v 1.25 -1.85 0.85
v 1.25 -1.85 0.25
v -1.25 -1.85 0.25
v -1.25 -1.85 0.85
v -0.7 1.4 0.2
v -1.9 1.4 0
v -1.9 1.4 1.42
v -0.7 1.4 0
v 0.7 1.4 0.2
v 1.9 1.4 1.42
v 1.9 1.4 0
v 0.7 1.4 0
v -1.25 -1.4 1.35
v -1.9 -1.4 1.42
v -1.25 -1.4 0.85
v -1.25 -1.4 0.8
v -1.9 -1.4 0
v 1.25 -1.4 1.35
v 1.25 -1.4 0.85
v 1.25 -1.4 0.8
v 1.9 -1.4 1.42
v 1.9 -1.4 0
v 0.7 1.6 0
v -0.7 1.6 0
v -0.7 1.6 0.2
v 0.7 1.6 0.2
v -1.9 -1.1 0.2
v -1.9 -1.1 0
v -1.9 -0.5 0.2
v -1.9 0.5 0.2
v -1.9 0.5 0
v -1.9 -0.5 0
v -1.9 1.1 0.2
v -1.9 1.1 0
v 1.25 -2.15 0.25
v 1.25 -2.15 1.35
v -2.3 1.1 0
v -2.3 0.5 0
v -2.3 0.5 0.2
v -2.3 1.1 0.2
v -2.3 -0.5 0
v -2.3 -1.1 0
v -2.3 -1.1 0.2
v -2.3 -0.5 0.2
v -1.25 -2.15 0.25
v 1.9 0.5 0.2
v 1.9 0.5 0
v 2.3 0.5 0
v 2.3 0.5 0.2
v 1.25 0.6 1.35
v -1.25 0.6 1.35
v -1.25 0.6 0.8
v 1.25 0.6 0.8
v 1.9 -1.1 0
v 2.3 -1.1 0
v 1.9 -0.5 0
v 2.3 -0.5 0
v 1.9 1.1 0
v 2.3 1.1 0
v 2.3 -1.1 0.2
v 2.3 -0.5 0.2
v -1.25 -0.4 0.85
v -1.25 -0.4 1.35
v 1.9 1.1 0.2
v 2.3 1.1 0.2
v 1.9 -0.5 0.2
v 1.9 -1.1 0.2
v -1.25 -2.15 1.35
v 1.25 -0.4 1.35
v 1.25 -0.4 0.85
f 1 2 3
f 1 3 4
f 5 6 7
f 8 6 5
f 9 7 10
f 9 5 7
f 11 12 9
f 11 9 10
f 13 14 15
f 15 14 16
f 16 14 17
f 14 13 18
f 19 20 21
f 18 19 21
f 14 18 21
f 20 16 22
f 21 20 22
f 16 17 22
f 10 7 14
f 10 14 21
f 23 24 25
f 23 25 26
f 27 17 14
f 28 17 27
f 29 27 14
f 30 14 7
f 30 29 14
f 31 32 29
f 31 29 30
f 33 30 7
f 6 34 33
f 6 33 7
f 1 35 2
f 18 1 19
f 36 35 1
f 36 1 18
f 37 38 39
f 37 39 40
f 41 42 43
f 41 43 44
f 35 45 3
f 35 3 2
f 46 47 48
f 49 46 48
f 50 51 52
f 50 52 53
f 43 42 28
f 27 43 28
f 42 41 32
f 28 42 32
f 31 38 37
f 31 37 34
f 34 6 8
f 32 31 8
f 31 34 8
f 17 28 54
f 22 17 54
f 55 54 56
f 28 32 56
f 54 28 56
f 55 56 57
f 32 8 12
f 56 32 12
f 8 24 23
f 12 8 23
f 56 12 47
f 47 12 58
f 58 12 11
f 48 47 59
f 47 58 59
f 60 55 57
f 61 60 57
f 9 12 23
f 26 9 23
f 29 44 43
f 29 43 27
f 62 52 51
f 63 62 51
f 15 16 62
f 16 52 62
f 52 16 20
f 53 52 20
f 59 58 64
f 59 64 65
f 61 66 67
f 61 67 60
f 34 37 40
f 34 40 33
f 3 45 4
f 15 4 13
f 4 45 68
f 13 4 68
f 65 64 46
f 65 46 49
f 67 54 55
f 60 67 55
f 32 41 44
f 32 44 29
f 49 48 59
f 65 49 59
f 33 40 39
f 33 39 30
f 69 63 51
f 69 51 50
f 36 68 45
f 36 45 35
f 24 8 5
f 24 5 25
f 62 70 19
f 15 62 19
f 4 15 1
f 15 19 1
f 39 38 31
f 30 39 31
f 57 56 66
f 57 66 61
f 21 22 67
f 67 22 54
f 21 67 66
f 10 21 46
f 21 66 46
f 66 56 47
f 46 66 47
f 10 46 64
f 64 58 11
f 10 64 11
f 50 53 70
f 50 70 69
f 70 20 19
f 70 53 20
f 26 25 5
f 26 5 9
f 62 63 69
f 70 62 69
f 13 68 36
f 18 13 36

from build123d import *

# Parameters (mm, degrees)
SKETCH004_W       = 2.5
SKETCH004_H       = 1.1
PAD001_DEPTH      = 0.75
PAD001_DEPTH_BACK = 1
SKETCH005_W       = 0.7
SKETCH005_H       = 1.6
POCKET001_DEPTH   = 2.501
SKETCH006_W       = 0.7
SKETCH006_H       = 0.6
SKETCH006_W_2     = 1.4
SKETCH006_H_2     = 0.4
PAD002_DEPTH      = 0.2
SKETCH002_W       = 3.8
SKETCH002_H       = 2.8
PAD_DEPTH         = 1.42
SKETCH003_W       = 2.5
SKETCH003_H       = 0.55
POCKET_DEPTH      = 2


with BuildPart() as buttonprofile_pocket:
    # Sketch004 → Pad001 (new body, two sides)
    with BuildSketch(Plane.XZ.offset(1.4)) as pad001_sk:
        with Locations((0, 0.8)):
            Rectangle(SKETCH004_W, SKETCH004_H)
    extrude(amount=PAD001_DEPTH)
    extrude(pad001_sk.sketch, amount=-PAD001_DEPTH_BACK)

    # Sketch005 → Pocket001 (cut, through all)
    with BuildSketch(Plane(origin=(1.25, -1.4, 0), x_dir=(0, 0, 1), z_dir=(1, 0, 0))):
        with Locations((0.5, -0.35)):
            Rectangle(SKETCH005_W, SKETCH005_H)
    extrude(amount=-POCKET001_DEPTH, mode=Mode.SUBTRACT)


with BuildPart() as pins_pad:
    # Sketch006 → Pad002 (new body)
    with BuildSketch(Plane.XY):
        with Locations((-1.95, -0.8)):
            Rectangle(SKETCH006_W, SKETCH006_H)
        with Locations((1.95, -0.8)):
            Rectangle(SKETCH006_W, SKETCH006_H)
        with Locations((1.95, 0.8)):
            Rectangle(SKETCH006_W, SKETCH006_H)
        with Locations((-1.95, 0.8)):
            Rectangle(SKETCH006_W, SKETCH006_H)
        with Locations((0, 1.4)):
            Rectangle(SKETCH006_W_2, SKETCH006_H_2)
    extrude(amount=PAD002_DEPTH)


with BuildPart() as fusion:
    # Sketch002 → Pad (new body)
    with BuildSketch(Plane.XY):
        Rectangle(SKETCH002_W, SKETCH002_H)
    extrude(amount=PAD_DEPTH)

    # Sketch003 → Pocket (cut)
    with BuildSketch(Plane.XZ.offset(1.4)):
        with Locations((0, 1.075)):
            Rectangle(SKETCH003_W, SKETCH003_H)
    extrude(amount=-POCKET_DEPTH, mode=Mode.SUBTRACT)

    # Fusion: union ButtonProfile_Pocket, Pins_Pad
    add(buttonprofile_pocket.part)
    add(pins_pad.part)


solid = fusion.part
